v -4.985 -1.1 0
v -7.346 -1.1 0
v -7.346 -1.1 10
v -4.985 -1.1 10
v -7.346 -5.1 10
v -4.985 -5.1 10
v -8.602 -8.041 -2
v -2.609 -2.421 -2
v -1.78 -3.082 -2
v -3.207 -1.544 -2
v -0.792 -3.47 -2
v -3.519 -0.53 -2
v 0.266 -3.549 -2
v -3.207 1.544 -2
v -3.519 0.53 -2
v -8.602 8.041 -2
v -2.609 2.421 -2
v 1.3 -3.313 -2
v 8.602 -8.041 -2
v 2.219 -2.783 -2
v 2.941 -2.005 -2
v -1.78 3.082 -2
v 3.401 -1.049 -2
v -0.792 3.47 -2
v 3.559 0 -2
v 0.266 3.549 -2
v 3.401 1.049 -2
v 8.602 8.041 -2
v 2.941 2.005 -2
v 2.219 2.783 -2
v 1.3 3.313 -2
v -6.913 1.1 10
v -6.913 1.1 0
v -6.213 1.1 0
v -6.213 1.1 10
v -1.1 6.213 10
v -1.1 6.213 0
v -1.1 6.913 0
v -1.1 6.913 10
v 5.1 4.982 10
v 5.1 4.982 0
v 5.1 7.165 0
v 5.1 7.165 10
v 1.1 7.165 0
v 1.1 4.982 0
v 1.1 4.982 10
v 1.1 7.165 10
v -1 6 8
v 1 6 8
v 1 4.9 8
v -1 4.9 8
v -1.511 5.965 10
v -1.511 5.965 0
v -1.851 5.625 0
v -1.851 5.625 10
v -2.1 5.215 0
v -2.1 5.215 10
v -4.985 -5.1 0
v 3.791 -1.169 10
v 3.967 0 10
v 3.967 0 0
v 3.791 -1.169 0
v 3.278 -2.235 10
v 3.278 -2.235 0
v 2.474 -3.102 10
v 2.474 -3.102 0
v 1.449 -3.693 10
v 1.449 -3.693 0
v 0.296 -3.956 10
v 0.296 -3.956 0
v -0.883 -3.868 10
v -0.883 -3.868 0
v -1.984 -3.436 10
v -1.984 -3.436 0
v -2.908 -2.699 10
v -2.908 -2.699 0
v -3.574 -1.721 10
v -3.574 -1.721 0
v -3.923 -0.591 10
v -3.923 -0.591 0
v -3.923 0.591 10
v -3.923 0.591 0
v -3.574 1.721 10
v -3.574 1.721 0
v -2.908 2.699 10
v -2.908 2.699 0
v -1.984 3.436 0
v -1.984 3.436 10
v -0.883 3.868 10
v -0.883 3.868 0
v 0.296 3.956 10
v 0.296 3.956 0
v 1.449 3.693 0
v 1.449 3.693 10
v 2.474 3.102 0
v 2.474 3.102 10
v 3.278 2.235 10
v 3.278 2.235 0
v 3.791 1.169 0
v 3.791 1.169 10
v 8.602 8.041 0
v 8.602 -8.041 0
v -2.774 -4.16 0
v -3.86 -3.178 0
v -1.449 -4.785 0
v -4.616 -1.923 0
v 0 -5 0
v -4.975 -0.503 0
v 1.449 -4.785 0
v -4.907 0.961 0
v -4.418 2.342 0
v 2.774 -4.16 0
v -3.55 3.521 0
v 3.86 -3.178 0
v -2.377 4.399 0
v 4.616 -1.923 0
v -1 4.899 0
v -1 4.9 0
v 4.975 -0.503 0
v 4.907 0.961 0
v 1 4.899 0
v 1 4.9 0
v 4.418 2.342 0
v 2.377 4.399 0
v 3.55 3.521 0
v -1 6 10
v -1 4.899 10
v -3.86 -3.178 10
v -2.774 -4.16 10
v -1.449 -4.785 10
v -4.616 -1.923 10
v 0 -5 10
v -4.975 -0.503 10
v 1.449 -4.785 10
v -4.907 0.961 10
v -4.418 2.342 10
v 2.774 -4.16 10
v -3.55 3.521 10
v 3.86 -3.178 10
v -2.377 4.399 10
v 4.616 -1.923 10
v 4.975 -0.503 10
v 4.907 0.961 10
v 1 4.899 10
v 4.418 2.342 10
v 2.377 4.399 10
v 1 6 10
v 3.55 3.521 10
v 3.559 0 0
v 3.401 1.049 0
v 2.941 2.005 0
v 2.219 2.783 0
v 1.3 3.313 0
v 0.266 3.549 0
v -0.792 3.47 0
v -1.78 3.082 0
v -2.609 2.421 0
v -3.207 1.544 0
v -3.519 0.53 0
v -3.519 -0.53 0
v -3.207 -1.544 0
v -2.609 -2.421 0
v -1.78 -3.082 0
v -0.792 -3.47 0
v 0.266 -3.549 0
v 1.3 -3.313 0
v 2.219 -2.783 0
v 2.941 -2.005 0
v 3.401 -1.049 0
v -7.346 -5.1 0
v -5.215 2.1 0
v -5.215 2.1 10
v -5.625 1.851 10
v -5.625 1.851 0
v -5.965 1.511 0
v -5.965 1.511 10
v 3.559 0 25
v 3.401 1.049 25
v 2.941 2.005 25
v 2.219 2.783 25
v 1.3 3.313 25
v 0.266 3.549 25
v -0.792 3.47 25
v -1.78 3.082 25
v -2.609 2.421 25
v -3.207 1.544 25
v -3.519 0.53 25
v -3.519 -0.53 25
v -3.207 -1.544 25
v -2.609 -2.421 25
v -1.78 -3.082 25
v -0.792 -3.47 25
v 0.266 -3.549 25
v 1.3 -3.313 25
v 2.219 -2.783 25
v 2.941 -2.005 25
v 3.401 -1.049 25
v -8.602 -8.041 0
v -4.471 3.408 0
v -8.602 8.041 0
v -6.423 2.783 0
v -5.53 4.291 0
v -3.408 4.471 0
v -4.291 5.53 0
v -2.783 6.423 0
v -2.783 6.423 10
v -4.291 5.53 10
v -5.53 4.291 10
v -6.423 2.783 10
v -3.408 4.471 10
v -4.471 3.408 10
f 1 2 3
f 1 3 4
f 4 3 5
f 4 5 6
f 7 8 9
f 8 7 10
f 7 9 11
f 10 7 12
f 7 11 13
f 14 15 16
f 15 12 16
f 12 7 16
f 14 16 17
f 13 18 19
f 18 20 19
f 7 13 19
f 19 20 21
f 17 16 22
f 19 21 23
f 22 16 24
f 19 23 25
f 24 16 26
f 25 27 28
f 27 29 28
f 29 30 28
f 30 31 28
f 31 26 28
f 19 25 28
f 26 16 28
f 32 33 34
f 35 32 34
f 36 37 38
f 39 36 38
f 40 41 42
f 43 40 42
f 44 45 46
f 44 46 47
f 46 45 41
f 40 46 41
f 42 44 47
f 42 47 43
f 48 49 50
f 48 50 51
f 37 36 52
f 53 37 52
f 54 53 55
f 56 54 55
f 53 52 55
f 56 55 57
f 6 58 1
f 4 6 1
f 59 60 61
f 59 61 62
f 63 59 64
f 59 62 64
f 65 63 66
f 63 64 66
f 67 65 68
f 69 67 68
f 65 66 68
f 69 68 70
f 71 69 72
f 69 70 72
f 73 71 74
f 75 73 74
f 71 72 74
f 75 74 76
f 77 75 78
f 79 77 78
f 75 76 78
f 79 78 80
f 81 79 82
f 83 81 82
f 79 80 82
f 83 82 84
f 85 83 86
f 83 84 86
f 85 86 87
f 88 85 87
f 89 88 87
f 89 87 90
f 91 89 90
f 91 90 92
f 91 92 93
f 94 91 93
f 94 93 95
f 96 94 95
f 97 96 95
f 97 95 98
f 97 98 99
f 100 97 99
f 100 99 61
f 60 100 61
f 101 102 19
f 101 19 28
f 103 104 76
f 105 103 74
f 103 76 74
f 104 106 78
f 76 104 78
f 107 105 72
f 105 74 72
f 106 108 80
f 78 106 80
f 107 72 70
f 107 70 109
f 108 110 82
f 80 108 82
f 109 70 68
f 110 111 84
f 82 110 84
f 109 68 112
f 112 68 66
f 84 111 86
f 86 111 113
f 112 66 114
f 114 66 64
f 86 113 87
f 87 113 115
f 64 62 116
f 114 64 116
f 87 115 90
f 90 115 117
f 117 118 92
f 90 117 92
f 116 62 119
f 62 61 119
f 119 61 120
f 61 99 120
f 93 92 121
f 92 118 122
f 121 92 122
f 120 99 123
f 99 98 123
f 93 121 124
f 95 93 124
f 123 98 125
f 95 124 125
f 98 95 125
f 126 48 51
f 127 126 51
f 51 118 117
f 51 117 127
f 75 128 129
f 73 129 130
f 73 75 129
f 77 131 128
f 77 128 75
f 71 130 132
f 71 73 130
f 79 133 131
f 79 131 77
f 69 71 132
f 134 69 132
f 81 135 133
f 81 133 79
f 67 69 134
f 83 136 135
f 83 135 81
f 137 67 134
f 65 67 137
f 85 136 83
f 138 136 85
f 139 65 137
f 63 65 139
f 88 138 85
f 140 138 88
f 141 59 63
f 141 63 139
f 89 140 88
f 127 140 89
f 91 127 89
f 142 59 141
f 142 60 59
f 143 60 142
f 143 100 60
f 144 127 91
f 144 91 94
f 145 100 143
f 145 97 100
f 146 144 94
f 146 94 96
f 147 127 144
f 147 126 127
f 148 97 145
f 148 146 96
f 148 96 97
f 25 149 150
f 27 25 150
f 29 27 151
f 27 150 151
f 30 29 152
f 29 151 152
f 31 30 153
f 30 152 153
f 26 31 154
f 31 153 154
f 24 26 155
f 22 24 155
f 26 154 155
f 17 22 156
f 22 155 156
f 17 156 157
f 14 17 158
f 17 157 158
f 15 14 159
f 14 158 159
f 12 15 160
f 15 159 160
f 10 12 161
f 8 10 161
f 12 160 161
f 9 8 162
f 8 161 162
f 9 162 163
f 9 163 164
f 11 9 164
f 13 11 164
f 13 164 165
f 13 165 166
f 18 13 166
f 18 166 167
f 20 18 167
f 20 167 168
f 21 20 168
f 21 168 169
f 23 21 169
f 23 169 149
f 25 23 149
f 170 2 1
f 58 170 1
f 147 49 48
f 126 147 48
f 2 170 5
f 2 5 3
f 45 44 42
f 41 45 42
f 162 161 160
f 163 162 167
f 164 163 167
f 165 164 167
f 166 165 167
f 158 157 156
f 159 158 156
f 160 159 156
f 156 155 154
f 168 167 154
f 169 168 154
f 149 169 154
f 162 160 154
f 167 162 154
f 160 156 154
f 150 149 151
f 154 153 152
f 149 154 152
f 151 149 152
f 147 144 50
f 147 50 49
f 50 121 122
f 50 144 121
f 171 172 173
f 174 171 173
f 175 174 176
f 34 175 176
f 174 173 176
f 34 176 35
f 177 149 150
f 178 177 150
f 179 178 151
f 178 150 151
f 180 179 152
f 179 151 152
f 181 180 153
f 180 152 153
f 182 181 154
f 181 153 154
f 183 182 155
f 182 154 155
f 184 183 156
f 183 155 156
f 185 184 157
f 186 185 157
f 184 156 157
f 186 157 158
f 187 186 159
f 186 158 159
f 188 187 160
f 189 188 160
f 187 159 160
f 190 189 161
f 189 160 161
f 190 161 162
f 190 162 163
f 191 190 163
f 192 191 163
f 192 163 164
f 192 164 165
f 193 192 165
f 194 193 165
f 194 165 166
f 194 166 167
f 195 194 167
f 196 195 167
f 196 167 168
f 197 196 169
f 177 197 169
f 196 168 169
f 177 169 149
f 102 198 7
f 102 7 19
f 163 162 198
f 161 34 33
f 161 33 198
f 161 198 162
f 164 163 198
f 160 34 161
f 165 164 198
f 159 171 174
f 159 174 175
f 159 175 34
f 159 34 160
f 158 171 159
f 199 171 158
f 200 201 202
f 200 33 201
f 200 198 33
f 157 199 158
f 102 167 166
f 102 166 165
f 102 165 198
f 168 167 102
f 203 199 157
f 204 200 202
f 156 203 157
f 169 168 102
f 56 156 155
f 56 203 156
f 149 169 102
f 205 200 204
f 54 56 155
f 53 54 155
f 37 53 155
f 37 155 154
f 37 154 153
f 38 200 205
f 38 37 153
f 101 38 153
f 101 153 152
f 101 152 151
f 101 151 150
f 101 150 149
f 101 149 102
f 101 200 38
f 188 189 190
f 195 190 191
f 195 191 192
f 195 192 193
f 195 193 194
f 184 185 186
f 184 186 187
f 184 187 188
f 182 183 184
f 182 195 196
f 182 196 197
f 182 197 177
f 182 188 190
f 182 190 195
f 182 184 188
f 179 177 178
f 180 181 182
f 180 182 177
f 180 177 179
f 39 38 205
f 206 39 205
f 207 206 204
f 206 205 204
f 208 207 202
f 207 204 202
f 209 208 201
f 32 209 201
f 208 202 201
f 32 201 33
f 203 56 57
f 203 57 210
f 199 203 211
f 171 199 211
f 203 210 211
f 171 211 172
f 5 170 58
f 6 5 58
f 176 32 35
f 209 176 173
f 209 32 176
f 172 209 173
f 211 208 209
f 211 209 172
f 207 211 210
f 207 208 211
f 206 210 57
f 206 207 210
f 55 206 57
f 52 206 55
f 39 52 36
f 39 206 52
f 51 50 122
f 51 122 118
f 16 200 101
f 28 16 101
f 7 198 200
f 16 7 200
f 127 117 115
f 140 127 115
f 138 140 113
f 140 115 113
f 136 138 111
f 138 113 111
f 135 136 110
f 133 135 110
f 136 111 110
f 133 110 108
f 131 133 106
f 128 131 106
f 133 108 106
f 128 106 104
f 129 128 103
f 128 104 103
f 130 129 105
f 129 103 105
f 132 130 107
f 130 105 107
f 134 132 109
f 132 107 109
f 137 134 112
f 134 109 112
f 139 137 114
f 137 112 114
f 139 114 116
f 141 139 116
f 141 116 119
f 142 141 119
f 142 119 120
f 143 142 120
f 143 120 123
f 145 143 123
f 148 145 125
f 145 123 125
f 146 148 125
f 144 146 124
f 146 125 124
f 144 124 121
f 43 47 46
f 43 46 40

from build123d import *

# Parameters (mm, degrees)
F1_DEPTH  = 10
F3_DEPTH  = 10
F2_W      = 4
F2_H      = 2.1826629527
F2_W_2    = 2.3604612797
F2_H_2    = 4
F4_R      = 3.9673771718
F5_DEPTH  = 25
F6_W      = 17.2031465918
F6_H      = 16.0824917257
F7_DEPTH  = 2
F8_R      = 3.5591026494
F9_DEPTH  = 15
F11_DEPTH = 10
F12_W     = 2
F12_H     = 8
F13_DEPTH = 1.1
F14_DEPTH = 25


with BuildPart() as f1:
    # F0 (on Top) → F1 (new body)
    with BuildSketch(Plane.XY):
        with BuildLine():
            ThreePointArc((-1, 4.8989794856), (-3.1622776602, -3.8729833462), (5, 0))
            ThreePointArc((5, 0), (3.8729833462, 3.1622776602), (1, 4.8989794856))
            ThreePointArc((1, 4.8989794856), (0, 5), (-1, 4.8989794856))
        make_face()
        with BuildLine():
            ThreePointArc((-1, 4.8989794856), (0, 5), (1, 4.8989794856))
            Line((1, 4.8989794856), (1, 6))
            Line((1, 6), (-1, 6))
            Line((-1, 6), (-1, 4.8989794856))
        make_face()
    extrude(amount=F1_DEPTH)

    # F4 (on face) → F5 (cut)
    with BuildSketch(Plane(origin=(0, 0, 0), x_dir=(1, 0, 0), z_dir=(0, 0, -1))):
        Circle(F4_R)
    extrude(amount=-F5_DEPTH, mode=Mode.SUBTRACT)

    # F12 (on face) → F13 (cut)
    with BuildSketch(Plane(origin=(0, 6, 0), x_dir=(-1, 0, 0), z_dir=(0, 1, 0))):
        with Locations((0, 4)):
            Rectangle(F12_W, F12_H)
    extrude(amount=-F13_DEPTH, mode=Mode.SUBTRACT)


with BuildPart() as f3:
    # F2 (on Top) → F3 (new body)
    with BuildSketch(Plane.XY):
        with BuildLine():
            ThreePointArc((-5.1334686129, 1.1), (-3.7123106012, 3.7123106012), (-1.1, 5.1334686129))
            Line((-1.1, 5.1334686129), (-1.1, 6.9130311731))
            ThreePointArc((-1.1, 6.9130311731), (-4.9497474683, 4.9497474683), (-6.9130311731, 1.1))
            Line((-6.9130311731, 1.1), (-5.1334686129, 1.1))
        make_face()
    extrude(amount=F3_DEPTH)

    # F6 (on Top) → F7 (join)
    with BuildSketch(Plane.XY):
        Rectangle(F6_W, F6_H)
    extrude(amount=-F7_DEPTH)

    # F8 (on face) → F9 (cut)
    with BuildSketch(Plane.XY):
        Circle(F8_R)
    extrude(amount=-F9_DEPTH, mode=Mode.SUBTRACT)

    # F10 (on face) → F11 (cut)
    with BuildSketch(Plane.XY.offset(10)):
        with BuildLine():
            Line((-1.1, 1.1), (-1.1, 5.5130311731))
            ThreePointArc((-1.1, 5.5130311731), (-1.6069363441, 5.3871391574), (-2.1, 5.2147399471))
            ThreePointArc((-2.1, 5.2147399471), (-3.9751423066, 3.9751423066), (-5.2147399471, 2.1))
            ThreePointArc((-5.2147399471, 2.1), (-5.3871391574, 1.6069363441), (-5.5130311731, 1.1))
            Line((-5.5130311731, 1.1), (-1.1, 1.1))
        make_face()
        with BuildLine():
            ThreePointArc((-2.1, 5.2147399471), (-1.6069363441, 5.3871391574), (-1.1, 5.5130311731))
            Line((-1.1, 5.5130311731), (-1.1, 6.2130311731))
            ThreePointArc((-1.1, 6.2130311731), (-1.6910985907, 5.8051400841), (-2.1, 5.2147399471))
        make_face()
        with BuildLine():
            ThreePointArc((-5.5130311731, 1.1), (-5.3871391574, 1.6069363441), (-5.2147399471, 2.1))
            ThreePointArc((-5.2147399471, 2.1), (-5.8051400841, 1.6910985907), (-6.2130311731, 1.1))
            Line((-6.2130311731, 1.1), (-5.5130311731, 1.1))
        make_face()
    extrude(amount=-F11_DEPTH, mode=Mode.SUBTRACT)


with BuildPart() as f3b:
    # F2 (on Top) → F3, piece 2 (new body)
    with BuildSketch(Plane.XY):
        with Locations((3.1, 6.073639961)):
            Rectangle(F2_W, F2_H)
    extrude(amount=F3_DEPTH)


with BuildPart() as f3c:
    # F2 (on Top) → F3, piece 3 (new body)
    with BuildSketch(Plane.XY):
        with Locations((-6.1654057354, -3.1)):
            Rectangle(F2_W_2, F2_H_2)
    extrude(amount=F3_DEPTH)


with BuildPart() as f14:
    # F8 (on face) → F14 (new body)
    with BuildSketch(Plane.XY):
        Circle(F8_R)
    extrude(amount=F14_DEPTH)


solid = Compound([f1.part, f3.part, f3b.part, f3c.part, f14.part])
